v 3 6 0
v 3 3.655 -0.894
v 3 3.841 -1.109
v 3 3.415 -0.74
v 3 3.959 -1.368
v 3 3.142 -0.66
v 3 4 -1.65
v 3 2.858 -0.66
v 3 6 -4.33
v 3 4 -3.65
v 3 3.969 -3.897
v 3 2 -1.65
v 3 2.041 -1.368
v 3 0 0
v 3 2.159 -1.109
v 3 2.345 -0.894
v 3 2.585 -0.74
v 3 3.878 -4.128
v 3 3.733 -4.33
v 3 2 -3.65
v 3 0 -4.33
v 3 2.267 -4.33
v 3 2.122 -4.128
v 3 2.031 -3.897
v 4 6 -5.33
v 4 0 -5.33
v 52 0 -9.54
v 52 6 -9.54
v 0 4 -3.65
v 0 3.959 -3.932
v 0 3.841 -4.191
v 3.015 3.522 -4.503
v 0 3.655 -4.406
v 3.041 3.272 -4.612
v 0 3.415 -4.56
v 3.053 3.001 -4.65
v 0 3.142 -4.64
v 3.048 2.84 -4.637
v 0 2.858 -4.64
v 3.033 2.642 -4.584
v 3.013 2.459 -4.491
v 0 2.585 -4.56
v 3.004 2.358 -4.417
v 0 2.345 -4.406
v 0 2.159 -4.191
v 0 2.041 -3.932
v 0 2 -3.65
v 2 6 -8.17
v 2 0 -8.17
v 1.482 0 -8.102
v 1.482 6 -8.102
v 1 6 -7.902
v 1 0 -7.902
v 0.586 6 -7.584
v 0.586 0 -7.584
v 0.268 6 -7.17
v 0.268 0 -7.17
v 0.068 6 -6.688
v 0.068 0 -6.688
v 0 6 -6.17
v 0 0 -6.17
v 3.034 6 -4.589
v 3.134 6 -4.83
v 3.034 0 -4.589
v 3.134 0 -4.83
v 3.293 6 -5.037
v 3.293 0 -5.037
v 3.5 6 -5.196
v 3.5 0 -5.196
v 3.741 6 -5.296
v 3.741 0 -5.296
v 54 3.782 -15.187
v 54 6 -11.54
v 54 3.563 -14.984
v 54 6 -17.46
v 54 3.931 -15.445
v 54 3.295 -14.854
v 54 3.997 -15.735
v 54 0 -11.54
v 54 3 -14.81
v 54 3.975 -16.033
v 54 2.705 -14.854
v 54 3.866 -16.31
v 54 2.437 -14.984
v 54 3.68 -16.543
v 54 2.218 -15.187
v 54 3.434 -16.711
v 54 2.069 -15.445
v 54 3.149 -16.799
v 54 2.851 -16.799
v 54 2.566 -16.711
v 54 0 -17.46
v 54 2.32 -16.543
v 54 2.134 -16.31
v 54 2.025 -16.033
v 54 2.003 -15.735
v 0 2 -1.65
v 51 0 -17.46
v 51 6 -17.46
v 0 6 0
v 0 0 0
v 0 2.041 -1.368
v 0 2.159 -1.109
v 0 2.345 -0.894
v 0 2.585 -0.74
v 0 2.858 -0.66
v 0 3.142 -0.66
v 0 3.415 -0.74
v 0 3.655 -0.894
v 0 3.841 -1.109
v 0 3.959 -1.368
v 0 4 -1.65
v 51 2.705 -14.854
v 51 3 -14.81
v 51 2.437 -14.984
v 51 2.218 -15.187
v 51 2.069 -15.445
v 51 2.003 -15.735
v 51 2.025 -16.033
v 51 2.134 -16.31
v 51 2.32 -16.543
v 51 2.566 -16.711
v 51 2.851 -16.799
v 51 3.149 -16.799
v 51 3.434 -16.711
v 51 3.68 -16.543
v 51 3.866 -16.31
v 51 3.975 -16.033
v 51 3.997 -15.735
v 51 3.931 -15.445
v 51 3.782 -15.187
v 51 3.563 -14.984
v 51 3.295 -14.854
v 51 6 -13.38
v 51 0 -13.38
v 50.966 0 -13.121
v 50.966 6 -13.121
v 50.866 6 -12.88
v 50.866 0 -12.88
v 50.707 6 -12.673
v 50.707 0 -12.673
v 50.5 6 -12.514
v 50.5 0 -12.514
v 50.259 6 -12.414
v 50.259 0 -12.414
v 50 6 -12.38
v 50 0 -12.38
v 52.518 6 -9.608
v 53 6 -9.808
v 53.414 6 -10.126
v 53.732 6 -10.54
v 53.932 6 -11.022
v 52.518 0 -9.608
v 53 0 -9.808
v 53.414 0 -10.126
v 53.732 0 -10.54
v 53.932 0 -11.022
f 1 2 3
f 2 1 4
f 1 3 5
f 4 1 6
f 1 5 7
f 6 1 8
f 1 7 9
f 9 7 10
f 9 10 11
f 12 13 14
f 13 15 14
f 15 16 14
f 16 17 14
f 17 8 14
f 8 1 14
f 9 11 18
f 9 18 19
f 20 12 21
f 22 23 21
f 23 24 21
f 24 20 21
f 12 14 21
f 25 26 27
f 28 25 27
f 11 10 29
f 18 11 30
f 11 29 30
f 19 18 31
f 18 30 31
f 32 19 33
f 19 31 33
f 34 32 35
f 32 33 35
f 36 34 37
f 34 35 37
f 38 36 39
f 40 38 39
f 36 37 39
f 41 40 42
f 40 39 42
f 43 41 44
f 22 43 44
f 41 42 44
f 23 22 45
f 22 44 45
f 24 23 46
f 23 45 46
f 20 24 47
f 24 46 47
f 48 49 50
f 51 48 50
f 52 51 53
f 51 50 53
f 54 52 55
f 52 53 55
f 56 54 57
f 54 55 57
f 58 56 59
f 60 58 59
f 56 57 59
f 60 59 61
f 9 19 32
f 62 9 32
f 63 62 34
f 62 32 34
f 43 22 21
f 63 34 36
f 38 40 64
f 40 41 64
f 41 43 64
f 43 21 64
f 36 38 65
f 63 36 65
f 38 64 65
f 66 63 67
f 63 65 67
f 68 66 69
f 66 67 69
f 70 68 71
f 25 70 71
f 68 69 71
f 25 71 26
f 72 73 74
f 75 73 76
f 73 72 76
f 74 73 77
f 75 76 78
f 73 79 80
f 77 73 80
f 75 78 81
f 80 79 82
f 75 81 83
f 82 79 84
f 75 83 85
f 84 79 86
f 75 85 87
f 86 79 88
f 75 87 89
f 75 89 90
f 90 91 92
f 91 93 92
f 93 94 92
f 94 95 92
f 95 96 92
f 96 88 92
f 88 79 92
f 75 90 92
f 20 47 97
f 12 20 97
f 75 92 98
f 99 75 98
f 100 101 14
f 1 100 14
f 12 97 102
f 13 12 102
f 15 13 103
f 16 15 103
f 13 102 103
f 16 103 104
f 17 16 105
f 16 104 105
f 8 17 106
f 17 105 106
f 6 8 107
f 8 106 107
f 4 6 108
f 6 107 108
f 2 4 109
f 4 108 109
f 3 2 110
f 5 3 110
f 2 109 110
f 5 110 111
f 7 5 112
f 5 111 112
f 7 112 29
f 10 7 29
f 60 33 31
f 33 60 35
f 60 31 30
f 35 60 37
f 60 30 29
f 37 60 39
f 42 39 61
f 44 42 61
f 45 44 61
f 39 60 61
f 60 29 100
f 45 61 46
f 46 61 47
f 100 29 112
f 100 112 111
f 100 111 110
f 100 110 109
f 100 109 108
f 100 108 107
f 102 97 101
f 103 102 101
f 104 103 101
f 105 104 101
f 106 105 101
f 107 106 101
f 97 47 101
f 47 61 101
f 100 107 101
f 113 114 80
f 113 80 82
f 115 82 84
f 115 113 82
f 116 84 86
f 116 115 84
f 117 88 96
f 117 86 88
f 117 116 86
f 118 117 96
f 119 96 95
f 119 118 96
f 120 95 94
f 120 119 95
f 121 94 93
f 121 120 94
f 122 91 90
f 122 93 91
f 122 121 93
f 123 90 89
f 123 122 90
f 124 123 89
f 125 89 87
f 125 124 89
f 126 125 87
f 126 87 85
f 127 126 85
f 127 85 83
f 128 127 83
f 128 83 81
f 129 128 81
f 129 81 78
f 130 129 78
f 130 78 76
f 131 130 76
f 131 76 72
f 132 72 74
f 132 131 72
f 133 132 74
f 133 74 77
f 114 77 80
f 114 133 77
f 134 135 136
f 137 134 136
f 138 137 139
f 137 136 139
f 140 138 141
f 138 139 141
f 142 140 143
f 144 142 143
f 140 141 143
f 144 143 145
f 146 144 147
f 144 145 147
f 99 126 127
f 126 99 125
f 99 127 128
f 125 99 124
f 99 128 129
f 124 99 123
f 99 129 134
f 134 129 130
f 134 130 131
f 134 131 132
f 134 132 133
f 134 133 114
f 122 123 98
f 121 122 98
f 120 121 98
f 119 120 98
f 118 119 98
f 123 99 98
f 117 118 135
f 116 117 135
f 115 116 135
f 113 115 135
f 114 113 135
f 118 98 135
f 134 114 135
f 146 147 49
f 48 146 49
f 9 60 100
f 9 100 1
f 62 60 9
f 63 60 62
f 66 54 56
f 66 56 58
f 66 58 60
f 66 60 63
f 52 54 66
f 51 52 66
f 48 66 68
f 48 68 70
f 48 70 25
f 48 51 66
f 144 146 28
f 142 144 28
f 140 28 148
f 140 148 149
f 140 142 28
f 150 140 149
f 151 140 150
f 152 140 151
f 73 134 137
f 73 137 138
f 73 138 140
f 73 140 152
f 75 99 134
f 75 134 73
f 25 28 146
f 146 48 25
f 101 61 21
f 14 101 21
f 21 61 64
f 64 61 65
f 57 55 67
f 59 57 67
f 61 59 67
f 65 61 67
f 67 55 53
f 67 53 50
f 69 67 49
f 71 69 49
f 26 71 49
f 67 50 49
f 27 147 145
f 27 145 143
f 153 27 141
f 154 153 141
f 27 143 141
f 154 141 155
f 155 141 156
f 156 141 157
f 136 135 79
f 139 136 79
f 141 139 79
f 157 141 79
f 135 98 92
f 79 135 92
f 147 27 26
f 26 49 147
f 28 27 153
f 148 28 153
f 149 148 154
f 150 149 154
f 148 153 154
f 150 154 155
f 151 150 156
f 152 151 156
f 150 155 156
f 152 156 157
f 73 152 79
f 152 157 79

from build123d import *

# Parameters (mm, degrees)
BOSS_EXTRUDE1_DEPTH = 6
SKETCH3_R           = 1
CUT_EXTRUDE1_DEPTH  = 59


with BuildPart() as part:
    # Sketch1 → Boss-Extrude1 (new body)
    with BuildSketch(Plane(origin=(0, 0, 0), x_dir=(1, 0, 0), z_dir=(0, 1, 0))):
        with BuildLine():
            Line((0, 6.17), (0, 0))
            Line((0, 0), (3, 0))
            Line((3, 0), (3, 4.33))
            ThreePointArc((3, 4.33), (3.292893219, 5.037106781), (4, 5.33))
            Line((4, 5.33), (52, 9.54))
            ThreePointArc((52, 9.54), (53.414213562, 10.125786438), (54, 11.54))
            Line((54, 11.54), (54, 17.46))
            Line((54, 17.46), (51, 17.46))
            Line((51, 17.46), (51, 13.38))
            ThreePointArc((51, 13.38), (50.707106781, 12.672893219), (50, 12.38))
            Line((50, 12.38), (2, 8.17))
            ThreePointArc((2, 8.17), (0.585786438, 7.584213562), (0, 6.17))
        make_face()
    extrude(amount=BOSS_EXTRUDE1_DEPTH)

    # Sketch3 → Cut-Extrude1 (cut)
    with BuildSketch(Plane(origin=(0, 0, 0), x_dir=(0, 0, -1), z_dir=(1, 0, 0))):
        with Locations(Location((15.81, 3, 0), (0, 0, 180))):
            Circle(SKETCH3_R)
        with BuildLine():
            Line((1.65, 4), (3.65, 4))
            ThreePointArc((3.65, 4), (4.65, 3), (3.65, 2))
            Line((3.65, 2), (1.65, 2))
            ThreePointArc((1.65, 2), (0.65, 3), (1.65, 4))
        make_face()
    extrude(amount=CUT_EXTRUDE1_DEPTH, mode=Mode.SUBTRACT)


solid = part.part
